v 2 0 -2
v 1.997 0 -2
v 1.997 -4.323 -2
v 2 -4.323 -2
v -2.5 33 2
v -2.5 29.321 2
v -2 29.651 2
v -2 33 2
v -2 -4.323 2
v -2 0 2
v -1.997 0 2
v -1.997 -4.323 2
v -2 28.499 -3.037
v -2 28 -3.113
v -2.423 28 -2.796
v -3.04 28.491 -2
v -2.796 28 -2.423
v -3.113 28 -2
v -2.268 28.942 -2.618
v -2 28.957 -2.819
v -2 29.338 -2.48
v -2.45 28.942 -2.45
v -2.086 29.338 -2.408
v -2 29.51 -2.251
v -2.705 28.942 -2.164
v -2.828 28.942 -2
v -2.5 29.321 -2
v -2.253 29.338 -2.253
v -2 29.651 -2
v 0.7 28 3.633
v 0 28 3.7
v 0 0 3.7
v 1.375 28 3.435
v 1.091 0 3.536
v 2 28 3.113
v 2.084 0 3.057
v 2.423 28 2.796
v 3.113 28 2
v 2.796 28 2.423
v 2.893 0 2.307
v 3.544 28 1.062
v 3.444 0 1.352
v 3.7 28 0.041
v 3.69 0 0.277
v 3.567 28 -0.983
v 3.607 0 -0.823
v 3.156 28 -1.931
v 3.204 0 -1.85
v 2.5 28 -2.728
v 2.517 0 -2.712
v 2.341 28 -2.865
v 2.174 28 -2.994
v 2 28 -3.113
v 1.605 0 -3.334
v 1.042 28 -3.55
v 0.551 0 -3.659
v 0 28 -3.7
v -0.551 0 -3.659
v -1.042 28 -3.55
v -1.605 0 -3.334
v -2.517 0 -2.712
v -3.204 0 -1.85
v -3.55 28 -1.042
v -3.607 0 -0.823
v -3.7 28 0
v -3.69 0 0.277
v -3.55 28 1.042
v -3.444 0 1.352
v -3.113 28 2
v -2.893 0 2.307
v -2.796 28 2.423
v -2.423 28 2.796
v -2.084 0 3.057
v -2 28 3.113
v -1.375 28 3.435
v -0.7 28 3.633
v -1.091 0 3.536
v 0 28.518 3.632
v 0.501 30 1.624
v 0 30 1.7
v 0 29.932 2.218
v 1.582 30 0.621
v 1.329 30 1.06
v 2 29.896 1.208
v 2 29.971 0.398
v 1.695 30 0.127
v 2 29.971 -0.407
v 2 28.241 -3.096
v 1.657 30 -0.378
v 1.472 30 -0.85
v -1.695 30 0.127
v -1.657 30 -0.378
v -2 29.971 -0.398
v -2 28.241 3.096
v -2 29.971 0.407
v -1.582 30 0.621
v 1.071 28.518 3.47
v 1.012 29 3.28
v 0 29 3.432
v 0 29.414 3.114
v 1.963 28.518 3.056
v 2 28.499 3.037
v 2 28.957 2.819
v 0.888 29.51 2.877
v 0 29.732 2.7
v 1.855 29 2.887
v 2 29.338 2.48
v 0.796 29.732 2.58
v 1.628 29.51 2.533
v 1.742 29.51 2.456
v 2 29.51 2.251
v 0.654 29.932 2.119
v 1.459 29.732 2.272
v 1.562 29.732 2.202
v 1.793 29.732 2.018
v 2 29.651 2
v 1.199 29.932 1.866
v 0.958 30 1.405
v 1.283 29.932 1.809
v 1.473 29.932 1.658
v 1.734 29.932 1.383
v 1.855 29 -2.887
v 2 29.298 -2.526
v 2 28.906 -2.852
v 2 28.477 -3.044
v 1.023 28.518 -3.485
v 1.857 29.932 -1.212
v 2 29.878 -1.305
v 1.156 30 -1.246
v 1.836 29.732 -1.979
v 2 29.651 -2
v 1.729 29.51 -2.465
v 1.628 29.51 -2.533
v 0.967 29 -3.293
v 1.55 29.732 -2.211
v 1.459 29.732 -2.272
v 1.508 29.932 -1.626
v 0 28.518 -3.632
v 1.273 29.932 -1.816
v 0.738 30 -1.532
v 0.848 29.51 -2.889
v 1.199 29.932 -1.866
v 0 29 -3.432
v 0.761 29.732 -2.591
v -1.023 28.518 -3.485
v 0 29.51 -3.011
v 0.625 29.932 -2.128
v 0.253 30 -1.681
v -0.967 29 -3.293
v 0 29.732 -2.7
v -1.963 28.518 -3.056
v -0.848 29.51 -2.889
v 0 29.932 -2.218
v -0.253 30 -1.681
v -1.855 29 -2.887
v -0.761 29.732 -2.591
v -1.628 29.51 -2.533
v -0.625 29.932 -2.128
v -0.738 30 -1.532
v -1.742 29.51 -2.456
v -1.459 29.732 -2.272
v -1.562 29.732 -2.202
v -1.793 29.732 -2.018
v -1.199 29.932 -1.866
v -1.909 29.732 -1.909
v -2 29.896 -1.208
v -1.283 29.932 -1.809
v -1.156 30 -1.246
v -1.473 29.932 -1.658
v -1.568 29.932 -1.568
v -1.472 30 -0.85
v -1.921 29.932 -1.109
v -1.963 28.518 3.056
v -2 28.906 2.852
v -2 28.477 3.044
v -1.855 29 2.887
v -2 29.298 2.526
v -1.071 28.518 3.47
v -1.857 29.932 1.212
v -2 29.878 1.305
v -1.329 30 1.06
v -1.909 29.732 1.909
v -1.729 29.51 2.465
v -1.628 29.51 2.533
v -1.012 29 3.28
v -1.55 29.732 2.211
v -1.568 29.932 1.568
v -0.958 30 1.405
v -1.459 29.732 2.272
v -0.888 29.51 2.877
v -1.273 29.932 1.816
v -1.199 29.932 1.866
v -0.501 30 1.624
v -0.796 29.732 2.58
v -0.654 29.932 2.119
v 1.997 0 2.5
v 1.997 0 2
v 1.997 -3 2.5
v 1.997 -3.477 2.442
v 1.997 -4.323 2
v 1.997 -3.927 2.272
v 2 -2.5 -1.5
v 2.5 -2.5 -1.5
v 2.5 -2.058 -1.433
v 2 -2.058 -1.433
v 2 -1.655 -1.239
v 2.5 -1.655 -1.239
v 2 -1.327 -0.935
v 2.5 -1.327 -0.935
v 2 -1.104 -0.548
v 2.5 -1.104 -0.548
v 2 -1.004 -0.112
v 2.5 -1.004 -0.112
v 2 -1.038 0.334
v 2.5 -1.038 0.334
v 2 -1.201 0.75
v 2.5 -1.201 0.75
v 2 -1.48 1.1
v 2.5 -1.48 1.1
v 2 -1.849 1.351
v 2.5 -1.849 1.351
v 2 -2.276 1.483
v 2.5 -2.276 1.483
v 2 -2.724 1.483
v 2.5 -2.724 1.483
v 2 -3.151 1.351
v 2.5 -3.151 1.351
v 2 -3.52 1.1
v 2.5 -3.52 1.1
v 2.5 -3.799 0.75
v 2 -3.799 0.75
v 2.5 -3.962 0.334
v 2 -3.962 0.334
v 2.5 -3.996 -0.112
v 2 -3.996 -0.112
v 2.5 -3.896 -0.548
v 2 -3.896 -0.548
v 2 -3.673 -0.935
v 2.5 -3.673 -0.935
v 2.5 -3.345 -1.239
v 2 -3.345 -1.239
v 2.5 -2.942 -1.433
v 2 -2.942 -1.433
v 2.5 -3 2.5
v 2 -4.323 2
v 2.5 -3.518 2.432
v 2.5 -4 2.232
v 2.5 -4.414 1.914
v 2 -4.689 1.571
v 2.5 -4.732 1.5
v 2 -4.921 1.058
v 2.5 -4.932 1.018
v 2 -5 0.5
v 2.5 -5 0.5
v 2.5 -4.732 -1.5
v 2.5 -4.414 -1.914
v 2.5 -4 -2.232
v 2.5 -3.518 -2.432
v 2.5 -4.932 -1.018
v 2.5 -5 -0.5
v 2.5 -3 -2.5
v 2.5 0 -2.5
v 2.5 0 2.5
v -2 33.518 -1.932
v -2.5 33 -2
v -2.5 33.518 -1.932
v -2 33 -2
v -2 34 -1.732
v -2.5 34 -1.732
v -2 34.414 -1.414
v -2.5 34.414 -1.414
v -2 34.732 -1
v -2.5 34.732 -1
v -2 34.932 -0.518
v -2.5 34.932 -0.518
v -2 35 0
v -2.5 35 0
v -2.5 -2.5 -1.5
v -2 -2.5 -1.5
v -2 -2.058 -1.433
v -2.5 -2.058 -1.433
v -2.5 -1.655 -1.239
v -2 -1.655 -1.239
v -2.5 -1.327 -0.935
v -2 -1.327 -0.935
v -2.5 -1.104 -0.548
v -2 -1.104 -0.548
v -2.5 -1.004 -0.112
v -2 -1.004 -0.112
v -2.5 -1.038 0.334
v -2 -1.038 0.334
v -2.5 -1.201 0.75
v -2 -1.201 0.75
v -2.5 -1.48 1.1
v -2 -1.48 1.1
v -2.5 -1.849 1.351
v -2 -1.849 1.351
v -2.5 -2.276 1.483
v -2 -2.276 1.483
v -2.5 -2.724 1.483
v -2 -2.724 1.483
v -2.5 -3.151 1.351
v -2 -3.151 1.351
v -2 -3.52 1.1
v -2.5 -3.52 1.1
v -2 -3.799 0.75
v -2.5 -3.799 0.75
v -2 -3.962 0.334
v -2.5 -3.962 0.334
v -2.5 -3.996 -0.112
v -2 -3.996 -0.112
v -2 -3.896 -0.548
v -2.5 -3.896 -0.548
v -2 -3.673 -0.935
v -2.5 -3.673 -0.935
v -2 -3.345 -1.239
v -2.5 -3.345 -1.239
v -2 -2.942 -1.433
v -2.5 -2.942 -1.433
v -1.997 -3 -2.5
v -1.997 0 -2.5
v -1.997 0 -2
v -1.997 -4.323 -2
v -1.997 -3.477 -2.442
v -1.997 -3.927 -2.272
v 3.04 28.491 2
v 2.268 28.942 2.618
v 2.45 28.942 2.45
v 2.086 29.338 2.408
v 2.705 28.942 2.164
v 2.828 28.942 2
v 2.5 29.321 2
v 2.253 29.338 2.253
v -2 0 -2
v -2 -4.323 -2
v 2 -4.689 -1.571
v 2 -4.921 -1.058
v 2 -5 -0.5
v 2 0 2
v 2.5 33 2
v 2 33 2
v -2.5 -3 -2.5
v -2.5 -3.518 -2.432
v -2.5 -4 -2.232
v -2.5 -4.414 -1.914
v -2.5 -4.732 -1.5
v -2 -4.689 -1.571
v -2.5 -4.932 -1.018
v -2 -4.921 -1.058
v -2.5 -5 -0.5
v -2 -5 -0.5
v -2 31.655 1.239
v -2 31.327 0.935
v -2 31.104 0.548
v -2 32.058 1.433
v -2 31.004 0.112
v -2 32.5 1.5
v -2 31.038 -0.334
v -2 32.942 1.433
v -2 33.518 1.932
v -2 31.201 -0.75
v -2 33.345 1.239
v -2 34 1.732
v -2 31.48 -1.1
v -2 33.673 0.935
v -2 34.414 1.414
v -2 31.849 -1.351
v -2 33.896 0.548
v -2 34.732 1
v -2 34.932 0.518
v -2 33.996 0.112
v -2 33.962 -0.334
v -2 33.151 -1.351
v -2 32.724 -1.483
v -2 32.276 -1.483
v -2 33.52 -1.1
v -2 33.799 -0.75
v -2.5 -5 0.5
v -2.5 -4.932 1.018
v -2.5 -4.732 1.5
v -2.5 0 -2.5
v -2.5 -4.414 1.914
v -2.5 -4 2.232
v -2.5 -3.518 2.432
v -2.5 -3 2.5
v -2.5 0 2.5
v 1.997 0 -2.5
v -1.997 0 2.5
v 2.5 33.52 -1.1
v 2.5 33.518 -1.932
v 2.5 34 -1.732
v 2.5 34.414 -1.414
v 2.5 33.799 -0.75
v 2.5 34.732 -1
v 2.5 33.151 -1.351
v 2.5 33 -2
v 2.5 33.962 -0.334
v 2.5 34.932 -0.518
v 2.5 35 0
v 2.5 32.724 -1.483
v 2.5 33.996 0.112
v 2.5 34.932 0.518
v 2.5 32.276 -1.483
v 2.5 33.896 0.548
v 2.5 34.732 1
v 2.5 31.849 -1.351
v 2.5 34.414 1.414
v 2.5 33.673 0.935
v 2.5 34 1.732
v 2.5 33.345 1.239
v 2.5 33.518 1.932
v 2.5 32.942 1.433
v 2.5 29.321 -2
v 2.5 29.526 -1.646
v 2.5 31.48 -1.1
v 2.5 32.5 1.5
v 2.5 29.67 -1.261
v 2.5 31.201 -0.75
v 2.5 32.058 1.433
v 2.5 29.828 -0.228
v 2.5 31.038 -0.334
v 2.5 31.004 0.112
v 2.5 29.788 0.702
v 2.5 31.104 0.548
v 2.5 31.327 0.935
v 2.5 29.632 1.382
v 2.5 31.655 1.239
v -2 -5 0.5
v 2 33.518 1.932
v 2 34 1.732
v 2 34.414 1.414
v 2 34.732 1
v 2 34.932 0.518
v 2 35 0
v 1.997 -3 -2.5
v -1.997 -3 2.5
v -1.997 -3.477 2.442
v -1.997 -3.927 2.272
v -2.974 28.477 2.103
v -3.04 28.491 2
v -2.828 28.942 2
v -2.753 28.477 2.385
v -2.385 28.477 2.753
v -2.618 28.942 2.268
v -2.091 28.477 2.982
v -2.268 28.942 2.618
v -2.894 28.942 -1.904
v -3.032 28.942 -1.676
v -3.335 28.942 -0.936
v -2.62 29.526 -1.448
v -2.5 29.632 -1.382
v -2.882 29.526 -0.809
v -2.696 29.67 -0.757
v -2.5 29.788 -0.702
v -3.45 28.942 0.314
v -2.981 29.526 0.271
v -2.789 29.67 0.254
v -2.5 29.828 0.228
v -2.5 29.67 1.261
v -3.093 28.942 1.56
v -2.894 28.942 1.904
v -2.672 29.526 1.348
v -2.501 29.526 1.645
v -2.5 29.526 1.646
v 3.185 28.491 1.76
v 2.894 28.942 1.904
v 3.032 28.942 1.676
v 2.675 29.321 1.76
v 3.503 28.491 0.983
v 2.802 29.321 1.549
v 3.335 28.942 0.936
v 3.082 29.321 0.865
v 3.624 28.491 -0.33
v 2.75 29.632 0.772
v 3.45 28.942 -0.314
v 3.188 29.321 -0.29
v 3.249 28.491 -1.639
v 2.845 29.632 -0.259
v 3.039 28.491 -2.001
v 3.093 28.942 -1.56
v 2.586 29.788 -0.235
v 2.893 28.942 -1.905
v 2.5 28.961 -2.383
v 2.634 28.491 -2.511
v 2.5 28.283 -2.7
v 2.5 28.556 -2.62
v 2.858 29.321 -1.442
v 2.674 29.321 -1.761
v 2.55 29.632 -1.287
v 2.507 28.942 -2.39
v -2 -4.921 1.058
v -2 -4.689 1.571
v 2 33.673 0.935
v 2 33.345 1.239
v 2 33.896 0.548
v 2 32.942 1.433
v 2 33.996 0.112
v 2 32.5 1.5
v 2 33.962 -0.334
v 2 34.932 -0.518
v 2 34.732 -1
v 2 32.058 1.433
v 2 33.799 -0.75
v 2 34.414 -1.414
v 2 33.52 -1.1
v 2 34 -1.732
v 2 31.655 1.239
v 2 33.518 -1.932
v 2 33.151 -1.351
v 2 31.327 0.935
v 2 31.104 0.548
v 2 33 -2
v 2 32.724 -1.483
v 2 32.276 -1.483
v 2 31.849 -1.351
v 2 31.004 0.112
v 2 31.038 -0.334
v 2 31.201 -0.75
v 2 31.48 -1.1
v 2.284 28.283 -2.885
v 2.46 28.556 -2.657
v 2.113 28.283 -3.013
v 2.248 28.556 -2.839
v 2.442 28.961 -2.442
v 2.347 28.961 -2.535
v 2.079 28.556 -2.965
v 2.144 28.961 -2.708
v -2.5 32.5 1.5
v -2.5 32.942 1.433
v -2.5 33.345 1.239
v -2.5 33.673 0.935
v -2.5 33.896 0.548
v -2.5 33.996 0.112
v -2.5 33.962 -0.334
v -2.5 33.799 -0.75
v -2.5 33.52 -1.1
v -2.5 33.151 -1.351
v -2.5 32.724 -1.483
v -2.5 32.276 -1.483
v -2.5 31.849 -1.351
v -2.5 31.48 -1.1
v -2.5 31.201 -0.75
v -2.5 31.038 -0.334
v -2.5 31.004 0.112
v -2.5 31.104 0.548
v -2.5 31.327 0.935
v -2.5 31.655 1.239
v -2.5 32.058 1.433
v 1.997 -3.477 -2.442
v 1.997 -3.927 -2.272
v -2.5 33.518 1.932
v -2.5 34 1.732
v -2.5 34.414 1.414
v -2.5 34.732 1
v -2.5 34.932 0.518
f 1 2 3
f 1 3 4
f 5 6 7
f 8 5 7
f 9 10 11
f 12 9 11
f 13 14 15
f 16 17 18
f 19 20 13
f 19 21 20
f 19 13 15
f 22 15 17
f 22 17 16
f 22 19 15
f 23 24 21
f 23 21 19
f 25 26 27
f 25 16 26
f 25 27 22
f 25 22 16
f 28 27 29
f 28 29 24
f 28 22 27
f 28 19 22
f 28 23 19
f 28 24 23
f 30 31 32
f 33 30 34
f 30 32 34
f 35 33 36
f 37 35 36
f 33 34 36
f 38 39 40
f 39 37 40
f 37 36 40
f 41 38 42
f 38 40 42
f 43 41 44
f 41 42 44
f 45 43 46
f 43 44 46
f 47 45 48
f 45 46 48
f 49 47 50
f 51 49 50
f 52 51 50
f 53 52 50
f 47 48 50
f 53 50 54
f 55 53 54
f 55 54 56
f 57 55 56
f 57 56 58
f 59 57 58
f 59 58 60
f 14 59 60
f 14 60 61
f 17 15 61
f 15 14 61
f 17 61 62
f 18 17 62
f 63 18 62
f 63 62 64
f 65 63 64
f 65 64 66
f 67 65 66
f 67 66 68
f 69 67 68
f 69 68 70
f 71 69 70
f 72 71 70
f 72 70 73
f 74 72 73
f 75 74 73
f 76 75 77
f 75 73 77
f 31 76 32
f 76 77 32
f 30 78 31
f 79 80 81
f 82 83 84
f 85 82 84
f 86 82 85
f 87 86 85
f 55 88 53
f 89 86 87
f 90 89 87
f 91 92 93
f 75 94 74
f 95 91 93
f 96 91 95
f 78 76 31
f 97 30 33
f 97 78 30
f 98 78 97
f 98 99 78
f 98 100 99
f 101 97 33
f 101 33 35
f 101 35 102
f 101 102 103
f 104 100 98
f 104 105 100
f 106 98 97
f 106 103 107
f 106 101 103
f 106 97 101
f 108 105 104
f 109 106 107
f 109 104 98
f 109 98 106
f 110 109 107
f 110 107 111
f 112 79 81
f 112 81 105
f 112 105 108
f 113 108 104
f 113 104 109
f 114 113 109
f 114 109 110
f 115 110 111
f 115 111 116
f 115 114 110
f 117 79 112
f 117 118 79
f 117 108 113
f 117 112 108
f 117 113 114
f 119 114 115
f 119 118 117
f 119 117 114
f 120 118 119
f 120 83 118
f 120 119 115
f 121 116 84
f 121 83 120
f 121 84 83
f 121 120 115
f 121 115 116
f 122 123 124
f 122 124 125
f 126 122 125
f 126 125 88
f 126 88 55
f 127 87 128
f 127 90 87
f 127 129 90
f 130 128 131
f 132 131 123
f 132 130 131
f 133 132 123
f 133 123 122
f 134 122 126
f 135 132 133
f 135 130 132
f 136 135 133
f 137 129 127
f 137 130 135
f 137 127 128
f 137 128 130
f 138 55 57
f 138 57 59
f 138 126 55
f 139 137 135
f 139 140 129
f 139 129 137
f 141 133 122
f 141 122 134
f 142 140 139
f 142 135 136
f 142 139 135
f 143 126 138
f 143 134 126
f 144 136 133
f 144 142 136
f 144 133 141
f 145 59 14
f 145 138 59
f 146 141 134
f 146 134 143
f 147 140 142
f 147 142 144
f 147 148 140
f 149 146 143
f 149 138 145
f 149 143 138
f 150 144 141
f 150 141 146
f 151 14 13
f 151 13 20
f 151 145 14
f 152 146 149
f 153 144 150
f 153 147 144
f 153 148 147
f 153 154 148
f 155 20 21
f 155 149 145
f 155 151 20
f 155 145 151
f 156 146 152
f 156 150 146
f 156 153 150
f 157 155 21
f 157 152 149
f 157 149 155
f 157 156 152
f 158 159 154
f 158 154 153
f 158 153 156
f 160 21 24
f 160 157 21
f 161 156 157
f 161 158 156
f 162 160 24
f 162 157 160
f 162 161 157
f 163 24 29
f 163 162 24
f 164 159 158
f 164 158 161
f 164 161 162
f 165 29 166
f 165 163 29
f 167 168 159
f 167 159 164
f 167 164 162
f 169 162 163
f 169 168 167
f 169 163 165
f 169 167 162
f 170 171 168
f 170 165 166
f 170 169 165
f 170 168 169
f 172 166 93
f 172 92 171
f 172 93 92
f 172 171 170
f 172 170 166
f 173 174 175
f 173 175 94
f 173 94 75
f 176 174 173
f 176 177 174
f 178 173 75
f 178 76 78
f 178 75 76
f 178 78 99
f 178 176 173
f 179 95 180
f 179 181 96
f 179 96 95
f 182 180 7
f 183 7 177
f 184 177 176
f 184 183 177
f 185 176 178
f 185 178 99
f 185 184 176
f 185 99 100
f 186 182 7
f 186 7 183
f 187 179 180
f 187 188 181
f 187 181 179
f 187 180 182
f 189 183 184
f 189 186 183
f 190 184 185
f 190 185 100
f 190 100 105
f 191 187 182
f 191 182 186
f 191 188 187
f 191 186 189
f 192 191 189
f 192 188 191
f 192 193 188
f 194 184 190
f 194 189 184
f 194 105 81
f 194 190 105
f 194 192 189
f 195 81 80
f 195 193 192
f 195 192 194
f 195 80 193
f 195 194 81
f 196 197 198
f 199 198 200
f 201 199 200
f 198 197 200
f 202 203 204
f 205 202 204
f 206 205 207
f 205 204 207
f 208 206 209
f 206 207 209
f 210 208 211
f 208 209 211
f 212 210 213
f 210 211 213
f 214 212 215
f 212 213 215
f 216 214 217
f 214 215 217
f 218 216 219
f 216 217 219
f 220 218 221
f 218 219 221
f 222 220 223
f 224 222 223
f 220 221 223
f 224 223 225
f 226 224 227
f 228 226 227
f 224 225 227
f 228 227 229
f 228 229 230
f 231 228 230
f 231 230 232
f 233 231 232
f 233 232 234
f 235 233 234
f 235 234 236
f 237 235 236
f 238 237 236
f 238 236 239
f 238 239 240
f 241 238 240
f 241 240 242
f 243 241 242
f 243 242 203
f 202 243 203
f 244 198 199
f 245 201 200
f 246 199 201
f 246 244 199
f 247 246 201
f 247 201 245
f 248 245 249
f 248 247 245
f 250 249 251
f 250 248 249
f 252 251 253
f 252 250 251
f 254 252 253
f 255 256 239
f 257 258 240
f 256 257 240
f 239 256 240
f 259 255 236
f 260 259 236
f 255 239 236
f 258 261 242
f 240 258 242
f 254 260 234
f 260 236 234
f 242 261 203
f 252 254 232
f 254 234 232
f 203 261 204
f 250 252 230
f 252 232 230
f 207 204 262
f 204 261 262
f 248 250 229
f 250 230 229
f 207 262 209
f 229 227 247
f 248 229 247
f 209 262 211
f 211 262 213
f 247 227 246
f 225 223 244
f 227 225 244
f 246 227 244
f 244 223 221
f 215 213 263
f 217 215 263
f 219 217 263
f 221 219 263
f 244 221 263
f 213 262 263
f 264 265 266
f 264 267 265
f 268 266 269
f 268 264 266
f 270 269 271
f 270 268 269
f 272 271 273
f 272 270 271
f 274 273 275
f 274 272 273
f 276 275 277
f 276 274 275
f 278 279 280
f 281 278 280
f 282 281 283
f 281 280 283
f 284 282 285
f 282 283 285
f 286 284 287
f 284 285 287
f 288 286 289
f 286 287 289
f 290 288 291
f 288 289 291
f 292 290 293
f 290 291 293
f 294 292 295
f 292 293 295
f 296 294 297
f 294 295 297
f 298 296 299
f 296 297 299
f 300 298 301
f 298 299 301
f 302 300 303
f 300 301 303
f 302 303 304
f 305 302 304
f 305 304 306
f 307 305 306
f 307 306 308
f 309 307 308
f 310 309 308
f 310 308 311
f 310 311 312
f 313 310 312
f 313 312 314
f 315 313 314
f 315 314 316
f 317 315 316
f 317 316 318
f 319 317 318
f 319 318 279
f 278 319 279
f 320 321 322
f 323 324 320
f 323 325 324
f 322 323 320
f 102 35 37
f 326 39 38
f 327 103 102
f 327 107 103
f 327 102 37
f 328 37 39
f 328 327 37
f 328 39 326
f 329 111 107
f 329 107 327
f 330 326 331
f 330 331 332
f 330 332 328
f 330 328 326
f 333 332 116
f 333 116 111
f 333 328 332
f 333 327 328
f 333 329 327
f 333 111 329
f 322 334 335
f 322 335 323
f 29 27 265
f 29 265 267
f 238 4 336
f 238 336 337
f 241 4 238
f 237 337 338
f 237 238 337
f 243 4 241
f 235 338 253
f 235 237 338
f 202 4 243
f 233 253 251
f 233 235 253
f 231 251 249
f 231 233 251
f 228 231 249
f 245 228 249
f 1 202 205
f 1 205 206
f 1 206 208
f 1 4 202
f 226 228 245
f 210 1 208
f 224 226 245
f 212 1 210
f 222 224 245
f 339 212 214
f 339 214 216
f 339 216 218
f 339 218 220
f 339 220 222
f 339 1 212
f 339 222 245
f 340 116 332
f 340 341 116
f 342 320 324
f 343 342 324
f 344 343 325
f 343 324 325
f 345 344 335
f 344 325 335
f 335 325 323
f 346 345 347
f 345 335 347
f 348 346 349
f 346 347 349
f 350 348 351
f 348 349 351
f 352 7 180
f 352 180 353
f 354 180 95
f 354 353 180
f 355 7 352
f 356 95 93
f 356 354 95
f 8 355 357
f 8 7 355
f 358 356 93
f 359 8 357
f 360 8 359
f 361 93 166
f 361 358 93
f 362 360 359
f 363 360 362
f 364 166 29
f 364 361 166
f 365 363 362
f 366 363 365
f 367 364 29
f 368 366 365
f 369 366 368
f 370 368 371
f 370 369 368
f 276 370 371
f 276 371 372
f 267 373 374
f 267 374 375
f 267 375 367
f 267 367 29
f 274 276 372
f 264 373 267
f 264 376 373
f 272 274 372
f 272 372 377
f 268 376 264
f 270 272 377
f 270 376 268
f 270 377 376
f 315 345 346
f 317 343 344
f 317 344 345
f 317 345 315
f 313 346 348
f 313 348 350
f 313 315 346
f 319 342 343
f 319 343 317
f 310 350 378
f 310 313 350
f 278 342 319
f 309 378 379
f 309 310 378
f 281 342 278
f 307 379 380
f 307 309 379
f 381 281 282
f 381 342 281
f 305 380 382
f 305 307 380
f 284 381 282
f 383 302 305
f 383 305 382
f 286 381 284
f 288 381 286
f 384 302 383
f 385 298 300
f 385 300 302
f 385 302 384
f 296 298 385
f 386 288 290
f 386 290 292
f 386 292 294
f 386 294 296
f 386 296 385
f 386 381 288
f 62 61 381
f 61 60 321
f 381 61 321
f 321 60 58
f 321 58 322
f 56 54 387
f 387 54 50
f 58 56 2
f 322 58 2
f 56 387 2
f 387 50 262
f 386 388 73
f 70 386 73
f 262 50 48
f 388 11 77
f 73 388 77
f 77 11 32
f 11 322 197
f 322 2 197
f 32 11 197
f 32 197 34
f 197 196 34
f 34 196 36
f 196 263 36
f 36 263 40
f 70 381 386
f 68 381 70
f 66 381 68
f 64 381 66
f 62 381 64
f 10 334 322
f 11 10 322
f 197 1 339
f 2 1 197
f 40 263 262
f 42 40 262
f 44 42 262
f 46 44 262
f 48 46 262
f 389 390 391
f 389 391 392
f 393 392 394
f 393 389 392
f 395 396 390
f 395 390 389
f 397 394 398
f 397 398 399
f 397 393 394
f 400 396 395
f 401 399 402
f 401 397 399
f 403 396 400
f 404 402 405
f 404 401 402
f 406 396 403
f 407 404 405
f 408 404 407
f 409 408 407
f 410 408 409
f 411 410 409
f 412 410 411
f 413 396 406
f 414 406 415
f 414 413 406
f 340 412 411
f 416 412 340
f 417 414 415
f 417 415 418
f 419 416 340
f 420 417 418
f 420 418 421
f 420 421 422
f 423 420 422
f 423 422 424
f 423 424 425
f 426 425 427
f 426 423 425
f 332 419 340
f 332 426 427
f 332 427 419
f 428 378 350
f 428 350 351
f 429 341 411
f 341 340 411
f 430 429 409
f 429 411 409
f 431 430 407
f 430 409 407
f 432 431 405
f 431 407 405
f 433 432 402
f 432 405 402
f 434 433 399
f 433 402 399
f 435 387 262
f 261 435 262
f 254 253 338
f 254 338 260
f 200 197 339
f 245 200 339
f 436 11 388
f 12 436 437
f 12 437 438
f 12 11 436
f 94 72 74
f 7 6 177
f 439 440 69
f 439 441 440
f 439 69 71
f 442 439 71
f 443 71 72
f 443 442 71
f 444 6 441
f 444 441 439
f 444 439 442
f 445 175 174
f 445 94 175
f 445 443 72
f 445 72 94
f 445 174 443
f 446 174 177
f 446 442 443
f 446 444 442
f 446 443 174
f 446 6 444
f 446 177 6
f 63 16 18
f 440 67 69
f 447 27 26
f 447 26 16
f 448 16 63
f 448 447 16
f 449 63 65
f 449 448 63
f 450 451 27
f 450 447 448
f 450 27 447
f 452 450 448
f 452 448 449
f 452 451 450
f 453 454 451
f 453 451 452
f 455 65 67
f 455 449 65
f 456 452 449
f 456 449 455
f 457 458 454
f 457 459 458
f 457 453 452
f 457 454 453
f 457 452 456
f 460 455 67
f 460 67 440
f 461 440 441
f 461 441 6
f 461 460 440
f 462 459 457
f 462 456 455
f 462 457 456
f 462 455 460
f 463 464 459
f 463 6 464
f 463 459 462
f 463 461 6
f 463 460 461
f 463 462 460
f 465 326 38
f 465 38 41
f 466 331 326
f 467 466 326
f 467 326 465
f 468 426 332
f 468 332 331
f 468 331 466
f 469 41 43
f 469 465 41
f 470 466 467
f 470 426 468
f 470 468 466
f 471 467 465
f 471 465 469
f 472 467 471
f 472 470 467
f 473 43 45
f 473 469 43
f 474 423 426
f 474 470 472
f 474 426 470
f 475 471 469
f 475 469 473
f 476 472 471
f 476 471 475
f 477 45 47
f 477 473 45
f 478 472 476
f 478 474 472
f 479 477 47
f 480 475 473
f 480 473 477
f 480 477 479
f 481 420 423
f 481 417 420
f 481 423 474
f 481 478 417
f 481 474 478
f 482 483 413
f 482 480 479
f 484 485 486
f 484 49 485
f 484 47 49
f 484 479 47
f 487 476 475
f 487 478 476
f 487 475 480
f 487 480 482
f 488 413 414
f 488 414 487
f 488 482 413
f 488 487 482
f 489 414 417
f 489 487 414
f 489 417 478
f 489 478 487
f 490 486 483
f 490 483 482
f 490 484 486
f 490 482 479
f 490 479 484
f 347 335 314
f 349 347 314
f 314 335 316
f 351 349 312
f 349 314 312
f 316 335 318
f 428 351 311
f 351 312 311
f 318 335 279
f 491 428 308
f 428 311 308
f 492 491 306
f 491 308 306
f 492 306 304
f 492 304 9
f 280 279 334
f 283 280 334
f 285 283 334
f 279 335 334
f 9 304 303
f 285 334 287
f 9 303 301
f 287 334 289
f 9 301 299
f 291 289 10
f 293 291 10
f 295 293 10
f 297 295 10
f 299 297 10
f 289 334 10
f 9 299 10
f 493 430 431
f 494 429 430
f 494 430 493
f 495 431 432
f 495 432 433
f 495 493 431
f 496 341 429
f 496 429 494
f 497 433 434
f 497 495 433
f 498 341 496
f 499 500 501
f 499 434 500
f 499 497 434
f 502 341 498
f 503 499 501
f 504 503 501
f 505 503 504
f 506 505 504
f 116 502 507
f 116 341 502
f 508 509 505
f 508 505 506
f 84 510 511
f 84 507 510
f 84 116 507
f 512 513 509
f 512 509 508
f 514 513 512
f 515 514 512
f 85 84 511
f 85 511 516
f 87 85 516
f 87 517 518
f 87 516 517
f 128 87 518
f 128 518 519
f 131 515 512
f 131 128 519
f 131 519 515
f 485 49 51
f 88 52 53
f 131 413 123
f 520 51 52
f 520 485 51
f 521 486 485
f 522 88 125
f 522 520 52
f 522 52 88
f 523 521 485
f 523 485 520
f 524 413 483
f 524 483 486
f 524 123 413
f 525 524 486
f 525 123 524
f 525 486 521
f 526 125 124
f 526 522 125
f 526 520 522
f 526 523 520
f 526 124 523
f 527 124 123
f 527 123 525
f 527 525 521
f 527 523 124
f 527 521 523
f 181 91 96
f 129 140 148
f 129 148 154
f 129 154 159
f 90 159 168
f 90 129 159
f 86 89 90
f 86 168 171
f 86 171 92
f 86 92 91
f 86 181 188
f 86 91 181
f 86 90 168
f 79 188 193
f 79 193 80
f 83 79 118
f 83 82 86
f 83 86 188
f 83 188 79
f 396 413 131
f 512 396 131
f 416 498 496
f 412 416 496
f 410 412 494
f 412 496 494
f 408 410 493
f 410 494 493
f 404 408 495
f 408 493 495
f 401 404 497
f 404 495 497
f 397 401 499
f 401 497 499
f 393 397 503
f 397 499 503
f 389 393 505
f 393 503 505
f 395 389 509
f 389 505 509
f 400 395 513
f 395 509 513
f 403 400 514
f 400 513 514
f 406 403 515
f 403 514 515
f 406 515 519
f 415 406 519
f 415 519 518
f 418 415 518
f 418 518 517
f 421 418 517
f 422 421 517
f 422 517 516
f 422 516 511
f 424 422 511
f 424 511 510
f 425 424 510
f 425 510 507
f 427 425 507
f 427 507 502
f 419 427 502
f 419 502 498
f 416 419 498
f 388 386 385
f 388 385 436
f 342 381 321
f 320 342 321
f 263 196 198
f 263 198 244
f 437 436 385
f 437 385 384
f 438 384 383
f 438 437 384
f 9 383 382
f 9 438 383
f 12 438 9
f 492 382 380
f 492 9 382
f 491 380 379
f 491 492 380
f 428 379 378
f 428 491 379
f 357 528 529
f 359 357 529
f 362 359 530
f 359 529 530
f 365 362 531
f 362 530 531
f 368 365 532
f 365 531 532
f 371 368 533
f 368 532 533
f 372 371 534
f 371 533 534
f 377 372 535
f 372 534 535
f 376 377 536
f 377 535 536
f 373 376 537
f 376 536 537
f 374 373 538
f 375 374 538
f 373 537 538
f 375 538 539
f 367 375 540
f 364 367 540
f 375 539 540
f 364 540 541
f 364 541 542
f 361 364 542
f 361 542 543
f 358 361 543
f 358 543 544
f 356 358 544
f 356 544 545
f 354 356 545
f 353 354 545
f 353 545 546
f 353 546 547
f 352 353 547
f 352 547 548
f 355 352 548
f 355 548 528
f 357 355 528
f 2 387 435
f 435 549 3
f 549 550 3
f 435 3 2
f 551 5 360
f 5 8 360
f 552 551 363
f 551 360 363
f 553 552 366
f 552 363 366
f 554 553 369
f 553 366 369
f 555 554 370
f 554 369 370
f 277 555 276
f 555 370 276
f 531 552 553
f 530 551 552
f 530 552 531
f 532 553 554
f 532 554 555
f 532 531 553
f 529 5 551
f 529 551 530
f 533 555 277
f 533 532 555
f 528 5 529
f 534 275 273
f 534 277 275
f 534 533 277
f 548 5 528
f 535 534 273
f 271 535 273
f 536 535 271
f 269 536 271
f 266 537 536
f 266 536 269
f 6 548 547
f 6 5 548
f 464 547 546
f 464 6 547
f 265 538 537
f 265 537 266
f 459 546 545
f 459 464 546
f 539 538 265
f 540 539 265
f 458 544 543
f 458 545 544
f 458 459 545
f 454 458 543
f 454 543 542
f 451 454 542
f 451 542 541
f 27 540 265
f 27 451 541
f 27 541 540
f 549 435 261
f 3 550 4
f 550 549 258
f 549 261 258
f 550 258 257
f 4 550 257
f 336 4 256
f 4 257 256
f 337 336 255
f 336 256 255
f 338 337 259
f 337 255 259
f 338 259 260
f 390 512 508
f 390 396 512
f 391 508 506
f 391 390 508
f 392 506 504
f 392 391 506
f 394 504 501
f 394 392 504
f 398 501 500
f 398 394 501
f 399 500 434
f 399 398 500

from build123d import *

# Parameters (mm, degrees)
SKETCH1_R           = 3.7
BOSS_EXTRUDE1_DEPTH = 30
SKETCH2_W           = 5
SKETCH2_H           = 4
SKETCH2_W_2         = 4
SKETCH2_H_2         = 3
BOSS_EXTRUDE2_DEPTH = 5
SKETCH3_W           = 4
SKETCH3_H           = 4.53219821
CUT_EXTRUDE1_DEPTH  = 5
SKETCH4_R           = 1.5
CUT_EXTRUDE2_DEPTH  = 15
FILLET1_R           = 2
FILLET2_R           = 2
SKETCH5_W           = 5
SKETCH5_H           = 5
SKETCH5_W_2         = 4
SKETCH5_H_2         = 4
BOSS_EXTRUDE3_DEPTH = 5
SKETCH6_W           = 3.994620944
SKETCH6_H           = 5.818695304
CUT_EXTRUDE3_DEPTH  = 5
SKETCH7_R           = 1.5
CUT_EXTRUDE4_DEPTH  = 5
FILLET3_R           = 2


# Some blends are built 0.0001 mm under size
with BuildPart() as part:
    # Sketch1 → Boss-Extrude1 (new body)
    with BuildSketch(Plane(origin=(0, 0, 0), x_dir=(1, 0, 0), z_dir=(0, 1, 0))):
        with Locations(Location((0, 0, 0), (0, 0, 270))):
            Circle(SKETCH1_R)
    extrude(amount=BOSS_EXTRUDE1_DEPTH)

    # Sketch2 → Boss-Extrude2 (add)
    with BuildSketch(Plane(origin=(0, 30, 0), x_dir=(1, 0, 0), z_dir=(0, 1, 0))):
        Rectangle(SKETCH2_W, SKETCH2_H)
        Rectangle(SKETCH2_W_2, SKETCH2_H_2, mode=Mode.SUBTRACT)
    extrude(amount=BOSS_EXTRUDE2_DEPTH)

    # Sketch3 → Cut-Extrude1 (cut)
    with BuildSketch(Plane(origin=(0, 35, 0), x_dir=(1, 0, 0), z_dir=(0, 1, 0))):
        Rectangle(SKETCH3_W, SKETCH3_H)
    extrude(amount=-CUT_EXTRUDE1_DEPTH, mode=Mode.SUBTRACT)

    # Sketch4 → Cut-Extrude2 (cut)
    with BuildSketch(Plane.ZY.offset(2.5)):
        with Locations((0, 32.5)):
            Circle(SKETCH4_R)
    extrude(amount=-CUT_EXTRUDE2_DEPTH, mode=Mode.SUBTRACT)

    # Fillet1
    fillet1_edges = [part.edges().sort_by_distance(p)[0] for p in [
        (-2.25, 35, 2),
        (-2.25, 35, -2),
        (2.25, 35, -2),
        (2.25, 35, 2),
    ]]
    fillet(fillet1_edges, radius=FILLET1_R - 0.0001)  # a hair under: the kernel refuses the full size

    # Fillet2
    # the kernel refuses this fillet: 2 mm, written as the material it takes off along each edge
    with BuildSketch(Plane(origin=(0, 30, 0), x_dir=(0, 0, 1), z_dir=(-1, 0, 0))) as fillet2_piece_1_section:
        with BuildLine():
            CenterArc((3.7 - FILLET2_R, -FILLET2_R), FILLET2_R, 0, 90)
            Line((3.7, -FILLET2_R), (3.7, 0))
            Line((3.7, 0), (3.7 - FILLET2_R, 0))
        make_face()
    fillet2_piece_1 = revolve(axis=Axis((0, 30, 0), (0, 1, 0)), mode=Mode.PRIVATE)
    fillet2_piece_1 = split(fillet2_piece_1, bisect_by=Plane(origin=(2, 29.996904363, 0.950092039), z_dir=(-1, 0, 0)), keep=Keep.TOP, mode=Mode.PRIVATE)
    fillet2_piece_1 = split(fillet2_piece_1, bisect_by=Plane(origin=(-2, 29.996904363, 0.950092039), z_dir=(1, 0, 0)), keep=Keep.TOP, mode=Mode.PRIVATE)
    add(fillet2_piece_1, mode=Mode.SUBTRACT)
    with BuildSketch(Plane(origin=(0, 30, 0), x_dir=(0, 0, 1), z_dir=(-1, 0, 0))) as fillet2_piece_2_section:
        with BuildLine():
            CenterArc((3.7 - FILLET2_R, -FILLET2_R), FILLET2_R, 0, 90)
            Line((3.7, -FILLET2_R), (3.7, 0))
            Line((3.7, 0), (3.7 - FILLET2_R, 0))
        make_face()
    fillet2_piece_2 = revolve(axis=Axis((0, 30, 0), (0, 1, 0)), mode=Mode.PRIVATE)
    fillet2_piece_2 = split(fillet2_piece_2, bisect_by=Plane(origin=(2.24397726, 29.466228533, 2), z_dir=(0, 0, 1)), keep=Keep.TOP, mode=Mode.PRIVATE)
    add(fillet2_piece_2, mode=Mode.SUBTRACT)
    with BuildSketch(Plane(origin=(0, 30, 0), x_dir=(0, 0, 1), z_dir=(-1, 0, 0))) as fillet2_piece_3_section:
        with BuildLine():
            CenterArc((3.7 - FILLET2_R, -FILLET2_R), FILLET2_R, 0, 90)
            Line((3.7, -FILLET2_R), (3.7, 0))
            Line((3.7, 0), (3.7 - FILLET2_R, 0))
        make_face()
    fillet2_piece_3 = revolve(axis=Axis((0, 30, 0), (0, 1, 0)), mode=Mode.PRIVATE)
    fillet2_piece_3 = split(fillet2_piece_3, bisect_by=Plane(origin=(2.5, 29.502863649, 1.19e-07), z_dir=(1, 0, 0)), keep=Keep.TOP, mode=Mode.PRIVATE)
    add(fillet2_piece_3, mode=Mode.SUBTRACT)
    with BuildSketch(Plane(origin=(0, 30, 0), x_dir=(0, 0, 1), z_dir=(-1, 0, 0))) as fillet2_piece_4_section:
        with BuildLine():
            CenterArc((3.7 - FILLET2_R, -FILLET2_R), FILLET2_R, 0, 90)
            Line((3.7, -FILLET2_R), (3.7, 0))
            Line((3.7, 0), (3.7 - FILLET2_R, 0))
        make_face()
    fillet2_piece_4 = revolve(axis=Axis((0, 30, 0), (0, 1, 0)), mode=Mode.PRIVATE)
    fillet2_piece_4 = split(fillet2_piece_4, bisect_by=Plane(origin=(2.243977257, 29.466228303, -2), z_dir=(0, 0, -1)), keep=Keep.TOP, mode=Mode.PRIVATE)
    add(fillet2_piece_4, mode=Mode.SUBTRACT)
    with BuildSketch(Plane(origin=(0, 30, 0), x_dir=(0, 0, 1), z_dir=(-1, 0, 0))) as fillet2_piece_5_section:
        with BuildLine():
            CenterArc((3.7 - FILLET2_R, -FILLET2_R), FILLET2_R, 0, 90)
            Line((3.7, -FILLET2_R), (3.7, 0))
            Line((3.7, 0), (3.7 - FILLET2_R, 0))
        make_face()
    fillet2_piece_5 = revolve(axis=Axis((0, 30, 0), (0, 1, 0)), mode=Mode.PRIVATE)
    fillet2_piece_5 = split(fillet2_piece_5, bisect_by=Plane(origin=(-2.5, 29.50286365, -1.18e-07), z_dir=(-1, 0, 0)), keep=Keep.TOP, mode=Mode.PRIVATE)
    add(fillet2_piece_5, mode=Mode.SUBTRACT)

    # Sketch5 → Boss-Extrude3 (add)
    with BuildSketch(Plane.XZ):
        Rectangle(SKETCH5_W, SKETCH5_H)
        Rectangle(SKETCH5_W_2, SKETCH5_H_2, mode=Mode.SUBTRACT)
    extrude(amount=BOSS_EXTRUDE3_DEPTH)

    # Sketch6 → Cut-Extrude3 (cut)
    with BuildSketch(Plane.XZ.offset(5)):
        Rectangle(SKETCH6_W, SKETCH6_H)
    extrude(amount=-CUT_EXTRUDE3_DEPTH, mode=Mode.SUBTRACT)

    # Sketch7 → Cut-Extrude4 (cut)
    with BuildSketch(Plane(origin=(2.5, 0, 0), x_dir=(0, 0, -1), z_dir=(1, 0, 0))):
        with Locations((0, -2.5)):
            Circle(SKETCH7_R)
    extrude(amount=-CUT_EXTRUDE4_DEPTH, mode=Mode.SUBTRACT)

    # Fillet3
    fillet3_edges = [part.edges().sort_by_distance(p)[0] for p in [
        (-2.248655236, -5, -2.5),
        (-2.248655236, -5, 2.5),
        (2.248655236, -5, 2.5),
        (2.248655236, -5, -2.5),
    ]]
    fillet(fillet3_edges, radius=FILLET3_R)


solid = part.part
